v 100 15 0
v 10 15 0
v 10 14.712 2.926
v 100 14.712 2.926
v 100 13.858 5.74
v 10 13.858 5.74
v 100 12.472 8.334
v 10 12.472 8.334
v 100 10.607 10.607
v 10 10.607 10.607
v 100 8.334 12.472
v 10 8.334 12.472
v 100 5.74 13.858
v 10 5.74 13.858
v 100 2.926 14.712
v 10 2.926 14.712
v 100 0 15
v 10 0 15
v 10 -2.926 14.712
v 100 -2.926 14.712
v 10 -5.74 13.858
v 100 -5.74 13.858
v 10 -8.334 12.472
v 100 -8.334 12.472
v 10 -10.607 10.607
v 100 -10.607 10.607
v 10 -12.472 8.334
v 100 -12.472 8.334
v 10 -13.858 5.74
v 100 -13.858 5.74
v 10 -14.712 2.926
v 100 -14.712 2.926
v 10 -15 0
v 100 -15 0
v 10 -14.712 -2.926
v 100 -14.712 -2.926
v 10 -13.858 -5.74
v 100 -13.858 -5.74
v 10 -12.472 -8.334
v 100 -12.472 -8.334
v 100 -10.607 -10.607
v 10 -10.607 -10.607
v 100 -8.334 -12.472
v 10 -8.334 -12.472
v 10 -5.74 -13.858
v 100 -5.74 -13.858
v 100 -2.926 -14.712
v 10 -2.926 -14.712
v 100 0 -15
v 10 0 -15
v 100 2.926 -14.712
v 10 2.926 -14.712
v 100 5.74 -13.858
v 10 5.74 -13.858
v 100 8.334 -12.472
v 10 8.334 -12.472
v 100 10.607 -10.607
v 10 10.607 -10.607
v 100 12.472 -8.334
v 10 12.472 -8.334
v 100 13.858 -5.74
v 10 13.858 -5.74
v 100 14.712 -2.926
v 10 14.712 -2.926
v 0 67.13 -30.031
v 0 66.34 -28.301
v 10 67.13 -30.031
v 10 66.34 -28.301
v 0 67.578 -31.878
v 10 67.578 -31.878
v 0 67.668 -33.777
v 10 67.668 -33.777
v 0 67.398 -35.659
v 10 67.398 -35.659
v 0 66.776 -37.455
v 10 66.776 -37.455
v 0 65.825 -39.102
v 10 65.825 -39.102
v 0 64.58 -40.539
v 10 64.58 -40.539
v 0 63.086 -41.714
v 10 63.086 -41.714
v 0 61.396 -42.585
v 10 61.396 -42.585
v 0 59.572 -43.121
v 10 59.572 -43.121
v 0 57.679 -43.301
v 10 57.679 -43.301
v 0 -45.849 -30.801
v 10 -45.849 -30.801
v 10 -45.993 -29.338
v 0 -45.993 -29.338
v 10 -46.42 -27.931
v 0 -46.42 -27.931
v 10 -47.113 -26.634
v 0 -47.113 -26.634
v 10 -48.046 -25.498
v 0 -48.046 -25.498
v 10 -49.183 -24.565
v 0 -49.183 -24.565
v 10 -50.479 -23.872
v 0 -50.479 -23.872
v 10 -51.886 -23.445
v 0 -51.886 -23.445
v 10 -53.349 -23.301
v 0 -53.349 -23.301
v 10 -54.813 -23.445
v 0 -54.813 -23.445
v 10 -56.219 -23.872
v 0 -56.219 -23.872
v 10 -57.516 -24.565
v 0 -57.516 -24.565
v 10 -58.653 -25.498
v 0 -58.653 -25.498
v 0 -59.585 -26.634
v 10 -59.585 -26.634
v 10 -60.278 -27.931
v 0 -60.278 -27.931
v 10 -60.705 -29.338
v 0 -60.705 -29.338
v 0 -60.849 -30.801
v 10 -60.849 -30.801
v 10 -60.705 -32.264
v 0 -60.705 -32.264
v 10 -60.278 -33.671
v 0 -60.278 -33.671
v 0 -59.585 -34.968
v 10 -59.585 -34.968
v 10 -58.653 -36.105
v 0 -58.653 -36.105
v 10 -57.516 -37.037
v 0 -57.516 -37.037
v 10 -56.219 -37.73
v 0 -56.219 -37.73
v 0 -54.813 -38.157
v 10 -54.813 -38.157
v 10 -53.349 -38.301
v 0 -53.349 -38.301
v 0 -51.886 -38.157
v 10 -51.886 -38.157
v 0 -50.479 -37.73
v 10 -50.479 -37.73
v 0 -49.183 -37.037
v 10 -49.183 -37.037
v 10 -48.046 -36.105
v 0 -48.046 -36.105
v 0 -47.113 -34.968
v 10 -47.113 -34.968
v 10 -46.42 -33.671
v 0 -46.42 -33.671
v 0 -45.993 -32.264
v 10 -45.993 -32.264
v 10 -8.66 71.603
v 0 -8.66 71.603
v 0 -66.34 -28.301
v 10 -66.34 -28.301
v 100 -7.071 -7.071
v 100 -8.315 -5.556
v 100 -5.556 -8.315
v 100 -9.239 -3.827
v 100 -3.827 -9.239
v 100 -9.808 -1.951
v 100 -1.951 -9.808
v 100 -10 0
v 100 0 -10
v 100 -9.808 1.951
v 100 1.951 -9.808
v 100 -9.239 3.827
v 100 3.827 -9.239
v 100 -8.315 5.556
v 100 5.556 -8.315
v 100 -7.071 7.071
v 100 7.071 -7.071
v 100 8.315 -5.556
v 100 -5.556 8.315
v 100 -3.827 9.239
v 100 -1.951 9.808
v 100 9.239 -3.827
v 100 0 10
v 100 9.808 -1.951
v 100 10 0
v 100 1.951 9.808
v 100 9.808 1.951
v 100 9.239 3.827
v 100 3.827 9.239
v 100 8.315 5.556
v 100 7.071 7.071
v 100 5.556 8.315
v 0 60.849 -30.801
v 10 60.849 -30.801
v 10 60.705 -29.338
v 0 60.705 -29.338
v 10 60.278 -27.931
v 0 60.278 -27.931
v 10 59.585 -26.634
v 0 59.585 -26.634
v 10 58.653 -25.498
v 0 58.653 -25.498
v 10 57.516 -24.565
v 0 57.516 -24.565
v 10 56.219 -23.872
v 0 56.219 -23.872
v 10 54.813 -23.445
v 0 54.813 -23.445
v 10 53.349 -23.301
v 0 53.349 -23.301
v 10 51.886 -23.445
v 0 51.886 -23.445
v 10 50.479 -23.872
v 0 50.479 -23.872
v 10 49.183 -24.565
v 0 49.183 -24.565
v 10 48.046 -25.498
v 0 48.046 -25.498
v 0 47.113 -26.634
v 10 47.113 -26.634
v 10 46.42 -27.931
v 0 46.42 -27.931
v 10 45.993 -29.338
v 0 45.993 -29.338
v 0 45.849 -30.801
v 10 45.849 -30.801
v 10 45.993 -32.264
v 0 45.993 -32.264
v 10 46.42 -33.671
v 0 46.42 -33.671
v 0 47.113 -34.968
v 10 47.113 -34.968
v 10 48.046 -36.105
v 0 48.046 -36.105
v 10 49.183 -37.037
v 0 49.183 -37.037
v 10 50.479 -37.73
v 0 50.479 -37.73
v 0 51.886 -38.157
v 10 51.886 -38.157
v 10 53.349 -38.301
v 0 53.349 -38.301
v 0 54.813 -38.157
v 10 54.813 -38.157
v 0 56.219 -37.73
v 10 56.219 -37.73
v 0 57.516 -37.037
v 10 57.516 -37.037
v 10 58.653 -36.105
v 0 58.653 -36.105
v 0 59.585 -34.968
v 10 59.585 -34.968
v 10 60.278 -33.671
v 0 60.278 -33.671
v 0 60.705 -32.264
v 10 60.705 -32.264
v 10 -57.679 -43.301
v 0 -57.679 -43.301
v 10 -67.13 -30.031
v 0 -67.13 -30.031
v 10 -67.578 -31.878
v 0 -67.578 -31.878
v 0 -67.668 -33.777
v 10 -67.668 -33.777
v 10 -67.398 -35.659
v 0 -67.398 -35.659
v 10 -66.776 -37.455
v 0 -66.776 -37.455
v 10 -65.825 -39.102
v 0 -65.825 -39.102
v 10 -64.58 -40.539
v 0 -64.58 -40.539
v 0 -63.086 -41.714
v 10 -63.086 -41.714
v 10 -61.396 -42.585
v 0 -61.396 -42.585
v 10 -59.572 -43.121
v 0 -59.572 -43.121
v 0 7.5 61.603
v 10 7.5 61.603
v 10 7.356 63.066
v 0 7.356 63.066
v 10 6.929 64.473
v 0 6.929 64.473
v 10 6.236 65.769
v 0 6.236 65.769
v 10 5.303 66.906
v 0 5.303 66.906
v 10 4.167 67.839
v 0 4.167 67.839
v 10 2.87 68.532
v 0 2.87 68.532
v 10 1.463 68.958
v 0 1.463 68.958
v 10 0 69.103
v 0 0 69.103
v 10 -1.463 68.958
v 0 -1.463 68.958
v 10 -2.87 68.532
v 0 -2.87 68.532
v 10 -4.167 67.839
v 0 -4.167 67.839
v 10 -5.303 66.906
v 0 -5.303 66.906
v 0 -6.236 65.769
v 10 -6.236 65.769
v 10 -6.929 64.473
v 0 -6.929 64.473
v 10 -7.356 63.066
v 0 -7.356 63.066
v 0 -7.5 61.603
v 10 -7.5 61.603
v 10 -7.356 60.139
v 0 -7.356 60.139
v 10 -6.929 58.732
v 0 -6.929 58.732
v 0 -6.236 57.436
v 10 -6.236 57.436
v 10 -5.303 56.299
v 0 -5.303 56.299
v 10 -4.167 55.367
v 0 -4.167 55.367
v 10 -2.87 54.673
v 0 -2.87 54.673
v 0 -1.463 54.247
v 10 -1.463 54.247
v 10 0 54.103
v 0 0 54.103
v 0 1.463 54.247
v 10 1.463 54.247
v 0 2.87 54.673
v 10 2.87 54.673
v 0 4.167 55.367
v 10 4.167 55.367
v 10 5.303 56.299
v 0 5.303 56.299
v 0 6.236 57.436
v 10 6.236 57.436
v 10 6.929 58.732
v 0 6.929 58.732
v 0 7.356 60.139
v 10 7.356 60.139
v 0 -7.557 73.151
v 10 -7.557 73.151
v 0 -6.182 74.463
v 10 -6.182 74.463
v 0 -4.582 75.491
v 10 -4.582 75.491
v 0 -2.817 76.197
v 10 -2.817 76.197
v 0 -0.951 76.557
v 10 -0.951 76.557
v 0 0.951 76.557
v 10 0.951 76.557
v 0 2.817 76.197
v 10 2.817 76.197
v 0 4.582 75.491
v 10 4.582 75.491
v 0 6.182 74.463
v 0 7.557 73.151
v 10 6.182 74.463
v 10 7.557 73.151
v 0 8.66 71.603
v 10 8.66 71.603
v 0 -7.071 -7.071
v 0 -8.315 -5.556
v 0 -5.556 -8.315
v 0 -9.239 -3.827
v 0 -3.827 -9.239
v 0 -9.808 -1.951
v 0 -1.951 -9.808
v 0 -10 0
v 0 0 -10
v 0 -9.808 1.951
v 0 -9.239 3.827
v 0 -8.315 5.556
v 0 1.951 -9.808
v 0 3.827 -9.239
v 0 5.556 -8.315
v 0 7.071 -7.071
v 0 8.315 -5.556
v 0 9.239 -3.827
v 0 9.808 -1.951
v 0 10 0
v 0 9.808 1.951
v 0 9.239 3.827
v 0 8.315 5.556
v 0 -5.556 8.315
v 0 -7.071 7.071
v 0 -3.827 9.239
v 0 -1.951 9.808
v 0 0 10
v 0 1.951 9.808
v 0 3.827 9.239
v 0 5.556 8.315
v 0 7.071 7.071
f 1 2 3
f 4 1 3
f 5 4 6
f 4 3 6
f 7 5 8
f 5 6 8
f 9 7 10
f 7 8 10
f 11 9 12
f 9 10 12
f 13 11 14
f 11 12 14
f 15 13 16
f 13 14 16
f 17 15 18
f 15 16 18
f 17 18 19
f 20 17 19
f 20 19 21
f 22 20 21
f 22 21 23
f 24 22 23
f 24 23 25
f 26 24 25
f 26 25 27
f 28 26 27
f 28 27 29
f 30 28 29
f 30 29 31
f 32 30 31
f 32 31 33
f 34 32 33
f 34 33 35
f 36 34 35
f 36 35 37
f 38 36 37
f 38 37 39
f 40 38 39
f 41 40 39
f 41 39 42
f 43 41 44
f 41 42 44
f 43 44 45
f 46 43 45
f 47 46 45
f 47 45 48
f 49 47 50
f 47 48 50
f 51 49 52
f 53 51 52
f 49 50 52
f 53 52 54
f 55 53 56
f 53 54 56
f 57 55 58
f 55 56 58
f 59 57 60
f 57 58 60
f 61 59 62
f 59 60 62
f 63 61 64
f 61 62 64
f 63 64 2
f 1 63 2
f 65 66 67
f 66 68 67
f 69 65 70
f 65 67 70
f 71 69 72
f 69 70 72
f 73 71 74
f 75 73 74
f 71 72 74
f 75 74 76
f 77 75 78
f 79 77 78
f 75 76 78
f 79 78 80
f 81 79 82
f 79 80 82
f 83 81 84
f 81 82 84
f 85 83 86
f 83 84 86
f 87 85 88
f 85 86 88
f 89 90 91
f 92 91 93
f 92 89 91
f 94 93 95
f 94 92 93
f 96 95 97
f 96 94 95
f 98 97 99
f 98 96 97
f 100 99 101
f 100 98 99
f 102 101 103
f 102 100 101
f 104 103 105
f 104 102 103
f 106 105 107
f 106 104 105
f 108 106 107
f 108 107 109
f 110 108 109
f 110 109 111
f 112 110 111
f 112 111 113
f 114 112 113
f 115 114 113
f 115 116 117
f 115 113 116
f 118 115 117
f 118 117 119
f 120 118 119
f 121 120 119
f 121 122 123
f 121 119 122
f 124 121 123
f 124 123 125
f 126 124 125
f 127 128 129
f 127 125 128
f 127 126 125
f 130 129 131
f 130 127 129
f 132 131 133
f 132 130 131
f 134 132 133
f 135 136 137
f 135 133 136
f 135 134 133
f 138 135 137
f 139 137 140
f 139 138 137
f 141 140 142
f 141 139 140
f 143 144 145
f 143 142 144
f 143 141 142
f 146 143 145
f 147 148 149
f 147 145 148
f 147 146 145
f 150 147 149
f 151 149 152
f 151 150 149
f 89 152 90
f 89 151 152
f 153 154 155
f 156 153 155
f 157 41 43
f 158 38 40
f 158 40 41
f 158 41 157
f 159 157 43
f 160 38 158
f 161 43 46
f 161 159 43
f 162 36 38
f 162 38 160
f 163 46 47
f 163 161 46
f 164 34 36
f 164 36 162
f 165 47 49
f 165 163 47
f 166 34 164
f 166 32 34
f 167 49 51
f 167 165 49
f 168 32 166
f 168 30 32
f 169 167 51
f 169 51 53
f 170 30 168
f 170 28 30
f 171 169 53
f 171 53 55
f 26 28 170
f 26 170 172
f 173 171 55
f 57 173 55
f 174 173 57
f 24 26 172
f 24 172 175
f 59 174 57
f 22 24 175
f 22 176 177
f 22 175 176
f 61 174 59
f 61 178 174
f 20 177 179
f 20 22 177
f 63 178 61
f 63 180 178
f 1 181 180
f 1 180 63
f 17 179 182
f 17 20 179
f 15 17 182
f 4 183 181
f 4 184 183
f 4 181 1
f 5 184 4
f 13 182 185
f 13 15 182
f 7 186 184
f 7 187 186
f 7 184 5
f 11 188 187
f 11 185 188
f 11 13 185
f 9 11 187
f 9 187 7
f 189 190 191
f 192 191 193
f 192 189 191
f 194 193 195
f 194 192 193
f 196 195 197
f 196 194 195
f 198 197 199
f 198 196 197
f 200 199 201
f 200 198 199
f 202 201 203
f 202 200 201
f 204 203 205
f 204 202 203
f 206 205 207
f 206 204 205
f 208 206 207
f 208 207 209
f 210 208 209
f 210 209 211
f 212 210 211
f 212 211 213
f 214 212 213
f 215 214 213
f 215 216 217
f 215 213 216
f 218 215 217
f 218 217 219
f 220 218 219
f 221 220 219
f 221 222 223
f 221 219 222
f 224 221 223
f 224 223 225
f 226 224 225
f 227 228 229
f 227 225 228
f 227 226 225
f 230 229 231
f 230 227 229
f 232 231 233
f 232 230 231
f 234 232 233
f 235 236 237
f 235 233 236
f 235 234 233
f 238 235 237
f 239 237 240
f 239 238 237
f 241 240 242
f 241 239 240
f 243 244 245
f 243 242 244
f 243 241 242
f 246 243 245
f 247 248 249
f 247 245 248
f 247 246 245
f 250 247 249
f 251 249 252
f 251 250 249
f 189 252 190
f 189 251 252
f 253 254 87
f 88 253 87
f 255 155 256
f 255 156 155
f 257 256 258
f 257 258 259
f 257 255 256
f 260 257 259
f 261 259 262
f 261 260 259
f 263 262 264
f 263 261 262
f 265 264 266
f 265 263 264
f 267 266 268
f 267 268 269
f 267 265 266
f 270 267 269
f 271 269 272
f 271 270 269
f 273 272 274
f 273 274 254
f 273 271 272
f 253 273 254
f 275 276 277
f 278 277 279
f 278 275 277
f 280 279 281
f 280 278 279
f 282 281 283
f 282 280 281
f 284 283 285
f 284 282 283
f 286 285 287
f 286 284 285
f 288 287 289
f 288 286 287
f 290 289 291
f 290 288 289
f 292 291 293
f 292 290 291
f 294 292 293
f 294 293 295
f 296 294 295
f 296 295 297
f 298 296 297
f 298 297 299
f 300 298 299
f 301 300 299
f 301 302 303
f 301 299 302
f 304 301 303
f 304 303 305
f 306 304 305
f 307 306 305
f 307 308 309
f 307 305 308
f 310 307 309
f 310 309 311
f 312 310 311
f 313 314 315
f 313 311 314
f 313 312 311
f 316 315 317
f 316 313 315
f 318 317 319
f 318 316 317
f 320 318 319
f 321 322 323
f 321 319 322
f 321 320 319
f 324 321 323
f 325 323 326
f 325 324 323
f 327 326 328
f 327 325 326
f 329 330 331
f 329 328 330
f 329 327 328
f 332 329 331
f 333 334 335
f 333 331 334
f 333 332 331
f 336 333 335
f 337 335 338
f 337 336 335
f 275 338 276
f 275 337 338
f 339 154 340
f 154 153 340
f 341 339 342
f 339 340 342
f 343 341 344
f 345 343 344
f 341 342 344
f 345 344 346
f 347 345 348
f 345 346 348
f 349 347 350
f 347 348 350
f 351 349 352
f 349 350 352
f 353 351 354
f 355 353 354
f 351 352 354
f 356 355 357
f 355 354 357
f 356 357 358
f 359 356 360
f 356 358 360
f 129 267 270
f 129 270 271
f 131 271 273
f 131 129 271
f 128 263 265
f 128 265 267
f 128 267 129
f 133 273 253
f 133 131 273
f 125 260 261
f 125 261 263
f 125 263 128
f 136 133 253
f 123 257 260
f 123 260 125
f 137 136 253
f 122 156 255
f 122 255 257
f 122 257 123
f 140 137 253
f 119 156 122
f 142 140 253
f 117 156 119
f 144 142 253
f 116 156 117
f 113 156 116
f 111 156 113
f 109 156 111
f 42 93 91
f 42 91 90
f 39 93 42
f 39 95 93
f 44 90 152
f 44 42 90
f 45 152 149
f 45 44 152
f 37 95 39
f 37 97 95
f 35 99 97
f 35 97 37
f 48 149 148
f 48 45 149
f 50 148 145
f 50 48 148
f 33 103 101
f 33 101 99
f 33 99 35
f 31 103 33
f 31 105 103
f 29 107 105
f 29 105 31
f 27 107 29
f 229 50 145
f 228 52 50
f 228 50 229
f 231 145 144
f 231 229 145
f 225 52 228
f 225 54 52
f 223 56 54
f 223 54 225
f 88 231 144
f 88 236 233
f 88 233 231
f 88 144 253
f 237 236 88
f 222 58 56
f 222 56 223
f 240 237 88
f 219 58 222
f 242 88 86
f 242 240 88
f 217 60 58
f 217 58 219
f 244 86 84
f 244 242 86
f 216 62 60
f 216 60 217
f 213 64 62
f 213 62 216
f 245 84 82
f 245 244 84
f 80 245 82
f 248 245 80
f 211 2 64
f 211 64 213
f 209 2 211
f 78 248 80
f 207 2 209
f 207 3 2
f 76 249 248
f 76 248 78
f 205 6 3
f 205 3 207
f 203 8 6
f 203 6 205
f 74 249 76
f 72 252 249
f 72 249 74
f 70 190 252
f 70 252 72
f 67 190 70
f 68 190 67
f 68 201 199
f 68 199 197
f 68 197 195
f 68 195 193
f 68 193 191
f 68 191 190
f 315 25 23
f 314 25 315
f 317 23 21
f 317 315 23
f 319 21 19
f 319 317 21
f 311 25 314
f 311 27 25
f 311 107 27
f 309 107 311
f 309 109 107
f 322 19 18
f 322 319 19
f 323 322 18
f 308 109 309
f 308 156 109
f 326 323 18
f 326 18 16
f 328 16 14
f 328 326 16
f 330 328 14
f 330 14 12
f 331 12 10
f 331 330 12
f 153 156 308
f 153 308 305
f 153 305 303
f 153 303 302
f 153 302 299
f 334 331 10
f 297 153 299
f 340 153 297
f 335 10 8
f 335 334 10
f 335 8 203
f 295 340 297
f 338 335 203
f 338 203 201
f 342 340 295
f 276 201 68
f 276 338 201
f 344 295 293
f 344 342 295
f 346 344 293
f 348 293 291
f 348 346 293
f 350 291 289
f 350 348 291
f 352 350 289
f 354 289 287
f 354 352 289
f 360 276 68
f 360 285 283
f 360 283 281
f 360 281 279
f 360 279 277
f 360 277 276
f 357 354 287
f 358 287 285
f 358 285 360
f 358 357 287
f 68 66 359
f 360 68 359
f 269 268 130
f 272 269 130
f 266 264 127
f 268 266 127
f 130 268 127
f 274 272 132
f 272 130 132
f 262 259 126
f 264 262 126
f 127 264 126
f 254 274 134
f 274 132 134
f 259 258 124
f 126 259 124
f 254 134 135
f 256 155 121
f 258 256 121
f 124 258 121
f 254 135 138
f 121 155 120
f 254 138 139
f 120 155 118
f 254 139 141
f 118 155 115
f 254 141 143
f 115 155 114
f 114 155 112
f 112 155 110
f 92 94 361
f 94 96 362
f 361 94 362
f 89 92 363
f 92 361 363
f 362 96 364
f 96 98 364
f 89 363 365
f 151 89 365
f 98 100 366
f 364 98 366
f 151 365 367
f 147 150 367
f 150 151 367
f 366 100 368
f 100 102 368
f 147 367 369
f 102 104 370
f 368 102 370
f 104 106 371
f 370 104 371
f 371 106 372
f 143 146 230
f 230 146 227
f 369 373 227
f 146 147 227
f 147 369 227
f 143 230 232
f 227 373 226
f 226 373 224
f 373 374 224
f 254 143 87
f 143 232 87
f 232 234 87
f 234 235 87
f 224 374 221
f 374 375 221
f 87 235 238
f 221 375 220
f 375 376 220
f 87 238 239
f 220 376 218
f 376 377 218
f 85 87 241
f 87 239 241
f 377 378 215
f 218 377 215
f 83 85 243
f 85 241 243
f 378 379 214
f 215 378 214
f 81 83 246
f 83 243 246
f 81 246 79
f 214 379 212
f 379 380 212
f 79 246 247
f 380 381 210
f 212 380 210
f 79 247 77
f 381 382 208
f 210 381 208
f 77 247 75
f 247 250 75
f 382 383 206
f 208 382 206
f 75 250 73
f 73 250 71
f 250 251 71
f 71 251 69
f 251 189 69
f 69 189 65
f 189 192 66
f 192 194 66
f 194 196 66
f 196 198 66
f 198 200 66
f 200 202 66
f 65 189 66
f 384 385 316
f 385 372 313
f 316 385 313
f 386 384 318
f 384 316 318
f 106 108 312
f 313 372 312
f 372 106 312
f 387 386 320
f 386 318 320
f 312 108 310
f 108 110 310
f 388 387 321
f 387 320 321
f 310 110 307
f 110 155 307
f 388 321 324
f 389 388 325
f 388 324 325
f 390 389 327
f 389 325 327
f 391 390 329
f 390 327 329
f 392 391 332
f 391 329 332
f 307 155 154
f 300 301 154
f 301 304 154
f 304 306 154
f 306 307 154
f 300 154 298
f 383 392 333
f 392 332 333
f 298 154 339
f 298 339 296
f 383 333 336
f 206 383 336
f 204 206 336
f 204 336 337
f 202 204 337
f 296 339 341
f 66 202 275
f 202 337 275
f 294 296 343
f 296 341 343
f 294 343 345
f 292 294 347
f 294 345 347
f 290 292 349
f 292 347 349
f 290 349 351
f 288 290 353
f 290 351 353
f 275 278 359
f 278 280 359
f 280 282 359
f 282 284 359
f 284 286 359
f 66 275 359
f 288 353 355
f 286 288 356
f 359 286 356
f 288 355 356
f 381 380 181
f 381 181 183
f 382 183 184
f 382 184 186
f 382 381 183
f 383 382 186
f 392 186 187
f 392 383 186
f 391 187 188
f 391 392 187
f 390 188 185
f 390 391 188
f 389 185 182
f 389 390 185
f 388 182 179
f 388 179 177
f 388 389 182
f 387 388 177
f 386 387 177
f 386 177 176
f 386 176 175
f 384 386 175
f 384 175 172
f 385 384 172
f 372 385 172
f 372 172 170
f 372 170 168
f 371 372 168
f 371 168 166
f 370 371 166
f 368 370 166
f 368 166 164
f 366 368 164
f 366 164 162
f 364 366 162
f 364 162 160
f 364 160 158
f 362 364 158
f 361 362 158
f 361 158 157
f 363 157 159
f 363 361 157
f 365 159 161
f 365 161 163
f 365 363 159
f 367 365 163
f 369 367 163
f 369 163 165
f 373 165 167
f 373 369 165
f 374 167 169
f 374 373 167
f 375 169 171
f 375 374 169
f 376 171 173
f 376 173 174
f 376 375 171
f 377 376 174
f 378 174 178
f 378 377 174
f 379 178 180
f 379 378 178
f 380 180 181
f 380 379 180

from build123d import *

# Parameters (mm, degrees)
F0_R     = 15
F0_R_2   = 10
F1_DEPTH = 100
F3_DEPTH = 10
F4_R     = 10
F5_R     = 7.5
F5_R_2   = 10
F6_DEPTH = 100.001


with BuildPart() as f1:
    # F0 (on Right) → F1 (new body)
    with BuildSketch(Plane.YZ):
        Circle(F0_R)
        Circle(F0_R_2, mode=Mode.SUBTRACT)
    extrude(amount=F1_DEPTH)

    # F2 (on Right) → F3 (join)
    with BuildSketch(Plane.YZ):
        Polygon((0, 86.60254), (-75, -43.30127), (75, -43.30127), align=None)
    extrude(amount=F3_DEPTH)

    # F4
    f4_edges = [f1.edges().sort_by_distance(p)[0] for p in [
        (5, 0, 86.60254),
        (5, 75, -43.30127),
        (5, -75, -43.30127),
    ]]
    fillet(f4_edges, radius=F4_R)

    # F5 (on Right) → F6 (cut, through all)
    with BuildSketch(Plane.YZ):
        with Locations((0, 61.60254)):
            Circle(F5_R)
        with Locations((53.349365, -30.80127)):
            Circle(F5_R)
        with Locations((-53.349365, -30.80127)):
            Circle(F5_R)
        Circle(F5_R_2)
    extrude(amount=F6_DEPTH, mode=Mode.SUBTRACT)


solid = f1.part
